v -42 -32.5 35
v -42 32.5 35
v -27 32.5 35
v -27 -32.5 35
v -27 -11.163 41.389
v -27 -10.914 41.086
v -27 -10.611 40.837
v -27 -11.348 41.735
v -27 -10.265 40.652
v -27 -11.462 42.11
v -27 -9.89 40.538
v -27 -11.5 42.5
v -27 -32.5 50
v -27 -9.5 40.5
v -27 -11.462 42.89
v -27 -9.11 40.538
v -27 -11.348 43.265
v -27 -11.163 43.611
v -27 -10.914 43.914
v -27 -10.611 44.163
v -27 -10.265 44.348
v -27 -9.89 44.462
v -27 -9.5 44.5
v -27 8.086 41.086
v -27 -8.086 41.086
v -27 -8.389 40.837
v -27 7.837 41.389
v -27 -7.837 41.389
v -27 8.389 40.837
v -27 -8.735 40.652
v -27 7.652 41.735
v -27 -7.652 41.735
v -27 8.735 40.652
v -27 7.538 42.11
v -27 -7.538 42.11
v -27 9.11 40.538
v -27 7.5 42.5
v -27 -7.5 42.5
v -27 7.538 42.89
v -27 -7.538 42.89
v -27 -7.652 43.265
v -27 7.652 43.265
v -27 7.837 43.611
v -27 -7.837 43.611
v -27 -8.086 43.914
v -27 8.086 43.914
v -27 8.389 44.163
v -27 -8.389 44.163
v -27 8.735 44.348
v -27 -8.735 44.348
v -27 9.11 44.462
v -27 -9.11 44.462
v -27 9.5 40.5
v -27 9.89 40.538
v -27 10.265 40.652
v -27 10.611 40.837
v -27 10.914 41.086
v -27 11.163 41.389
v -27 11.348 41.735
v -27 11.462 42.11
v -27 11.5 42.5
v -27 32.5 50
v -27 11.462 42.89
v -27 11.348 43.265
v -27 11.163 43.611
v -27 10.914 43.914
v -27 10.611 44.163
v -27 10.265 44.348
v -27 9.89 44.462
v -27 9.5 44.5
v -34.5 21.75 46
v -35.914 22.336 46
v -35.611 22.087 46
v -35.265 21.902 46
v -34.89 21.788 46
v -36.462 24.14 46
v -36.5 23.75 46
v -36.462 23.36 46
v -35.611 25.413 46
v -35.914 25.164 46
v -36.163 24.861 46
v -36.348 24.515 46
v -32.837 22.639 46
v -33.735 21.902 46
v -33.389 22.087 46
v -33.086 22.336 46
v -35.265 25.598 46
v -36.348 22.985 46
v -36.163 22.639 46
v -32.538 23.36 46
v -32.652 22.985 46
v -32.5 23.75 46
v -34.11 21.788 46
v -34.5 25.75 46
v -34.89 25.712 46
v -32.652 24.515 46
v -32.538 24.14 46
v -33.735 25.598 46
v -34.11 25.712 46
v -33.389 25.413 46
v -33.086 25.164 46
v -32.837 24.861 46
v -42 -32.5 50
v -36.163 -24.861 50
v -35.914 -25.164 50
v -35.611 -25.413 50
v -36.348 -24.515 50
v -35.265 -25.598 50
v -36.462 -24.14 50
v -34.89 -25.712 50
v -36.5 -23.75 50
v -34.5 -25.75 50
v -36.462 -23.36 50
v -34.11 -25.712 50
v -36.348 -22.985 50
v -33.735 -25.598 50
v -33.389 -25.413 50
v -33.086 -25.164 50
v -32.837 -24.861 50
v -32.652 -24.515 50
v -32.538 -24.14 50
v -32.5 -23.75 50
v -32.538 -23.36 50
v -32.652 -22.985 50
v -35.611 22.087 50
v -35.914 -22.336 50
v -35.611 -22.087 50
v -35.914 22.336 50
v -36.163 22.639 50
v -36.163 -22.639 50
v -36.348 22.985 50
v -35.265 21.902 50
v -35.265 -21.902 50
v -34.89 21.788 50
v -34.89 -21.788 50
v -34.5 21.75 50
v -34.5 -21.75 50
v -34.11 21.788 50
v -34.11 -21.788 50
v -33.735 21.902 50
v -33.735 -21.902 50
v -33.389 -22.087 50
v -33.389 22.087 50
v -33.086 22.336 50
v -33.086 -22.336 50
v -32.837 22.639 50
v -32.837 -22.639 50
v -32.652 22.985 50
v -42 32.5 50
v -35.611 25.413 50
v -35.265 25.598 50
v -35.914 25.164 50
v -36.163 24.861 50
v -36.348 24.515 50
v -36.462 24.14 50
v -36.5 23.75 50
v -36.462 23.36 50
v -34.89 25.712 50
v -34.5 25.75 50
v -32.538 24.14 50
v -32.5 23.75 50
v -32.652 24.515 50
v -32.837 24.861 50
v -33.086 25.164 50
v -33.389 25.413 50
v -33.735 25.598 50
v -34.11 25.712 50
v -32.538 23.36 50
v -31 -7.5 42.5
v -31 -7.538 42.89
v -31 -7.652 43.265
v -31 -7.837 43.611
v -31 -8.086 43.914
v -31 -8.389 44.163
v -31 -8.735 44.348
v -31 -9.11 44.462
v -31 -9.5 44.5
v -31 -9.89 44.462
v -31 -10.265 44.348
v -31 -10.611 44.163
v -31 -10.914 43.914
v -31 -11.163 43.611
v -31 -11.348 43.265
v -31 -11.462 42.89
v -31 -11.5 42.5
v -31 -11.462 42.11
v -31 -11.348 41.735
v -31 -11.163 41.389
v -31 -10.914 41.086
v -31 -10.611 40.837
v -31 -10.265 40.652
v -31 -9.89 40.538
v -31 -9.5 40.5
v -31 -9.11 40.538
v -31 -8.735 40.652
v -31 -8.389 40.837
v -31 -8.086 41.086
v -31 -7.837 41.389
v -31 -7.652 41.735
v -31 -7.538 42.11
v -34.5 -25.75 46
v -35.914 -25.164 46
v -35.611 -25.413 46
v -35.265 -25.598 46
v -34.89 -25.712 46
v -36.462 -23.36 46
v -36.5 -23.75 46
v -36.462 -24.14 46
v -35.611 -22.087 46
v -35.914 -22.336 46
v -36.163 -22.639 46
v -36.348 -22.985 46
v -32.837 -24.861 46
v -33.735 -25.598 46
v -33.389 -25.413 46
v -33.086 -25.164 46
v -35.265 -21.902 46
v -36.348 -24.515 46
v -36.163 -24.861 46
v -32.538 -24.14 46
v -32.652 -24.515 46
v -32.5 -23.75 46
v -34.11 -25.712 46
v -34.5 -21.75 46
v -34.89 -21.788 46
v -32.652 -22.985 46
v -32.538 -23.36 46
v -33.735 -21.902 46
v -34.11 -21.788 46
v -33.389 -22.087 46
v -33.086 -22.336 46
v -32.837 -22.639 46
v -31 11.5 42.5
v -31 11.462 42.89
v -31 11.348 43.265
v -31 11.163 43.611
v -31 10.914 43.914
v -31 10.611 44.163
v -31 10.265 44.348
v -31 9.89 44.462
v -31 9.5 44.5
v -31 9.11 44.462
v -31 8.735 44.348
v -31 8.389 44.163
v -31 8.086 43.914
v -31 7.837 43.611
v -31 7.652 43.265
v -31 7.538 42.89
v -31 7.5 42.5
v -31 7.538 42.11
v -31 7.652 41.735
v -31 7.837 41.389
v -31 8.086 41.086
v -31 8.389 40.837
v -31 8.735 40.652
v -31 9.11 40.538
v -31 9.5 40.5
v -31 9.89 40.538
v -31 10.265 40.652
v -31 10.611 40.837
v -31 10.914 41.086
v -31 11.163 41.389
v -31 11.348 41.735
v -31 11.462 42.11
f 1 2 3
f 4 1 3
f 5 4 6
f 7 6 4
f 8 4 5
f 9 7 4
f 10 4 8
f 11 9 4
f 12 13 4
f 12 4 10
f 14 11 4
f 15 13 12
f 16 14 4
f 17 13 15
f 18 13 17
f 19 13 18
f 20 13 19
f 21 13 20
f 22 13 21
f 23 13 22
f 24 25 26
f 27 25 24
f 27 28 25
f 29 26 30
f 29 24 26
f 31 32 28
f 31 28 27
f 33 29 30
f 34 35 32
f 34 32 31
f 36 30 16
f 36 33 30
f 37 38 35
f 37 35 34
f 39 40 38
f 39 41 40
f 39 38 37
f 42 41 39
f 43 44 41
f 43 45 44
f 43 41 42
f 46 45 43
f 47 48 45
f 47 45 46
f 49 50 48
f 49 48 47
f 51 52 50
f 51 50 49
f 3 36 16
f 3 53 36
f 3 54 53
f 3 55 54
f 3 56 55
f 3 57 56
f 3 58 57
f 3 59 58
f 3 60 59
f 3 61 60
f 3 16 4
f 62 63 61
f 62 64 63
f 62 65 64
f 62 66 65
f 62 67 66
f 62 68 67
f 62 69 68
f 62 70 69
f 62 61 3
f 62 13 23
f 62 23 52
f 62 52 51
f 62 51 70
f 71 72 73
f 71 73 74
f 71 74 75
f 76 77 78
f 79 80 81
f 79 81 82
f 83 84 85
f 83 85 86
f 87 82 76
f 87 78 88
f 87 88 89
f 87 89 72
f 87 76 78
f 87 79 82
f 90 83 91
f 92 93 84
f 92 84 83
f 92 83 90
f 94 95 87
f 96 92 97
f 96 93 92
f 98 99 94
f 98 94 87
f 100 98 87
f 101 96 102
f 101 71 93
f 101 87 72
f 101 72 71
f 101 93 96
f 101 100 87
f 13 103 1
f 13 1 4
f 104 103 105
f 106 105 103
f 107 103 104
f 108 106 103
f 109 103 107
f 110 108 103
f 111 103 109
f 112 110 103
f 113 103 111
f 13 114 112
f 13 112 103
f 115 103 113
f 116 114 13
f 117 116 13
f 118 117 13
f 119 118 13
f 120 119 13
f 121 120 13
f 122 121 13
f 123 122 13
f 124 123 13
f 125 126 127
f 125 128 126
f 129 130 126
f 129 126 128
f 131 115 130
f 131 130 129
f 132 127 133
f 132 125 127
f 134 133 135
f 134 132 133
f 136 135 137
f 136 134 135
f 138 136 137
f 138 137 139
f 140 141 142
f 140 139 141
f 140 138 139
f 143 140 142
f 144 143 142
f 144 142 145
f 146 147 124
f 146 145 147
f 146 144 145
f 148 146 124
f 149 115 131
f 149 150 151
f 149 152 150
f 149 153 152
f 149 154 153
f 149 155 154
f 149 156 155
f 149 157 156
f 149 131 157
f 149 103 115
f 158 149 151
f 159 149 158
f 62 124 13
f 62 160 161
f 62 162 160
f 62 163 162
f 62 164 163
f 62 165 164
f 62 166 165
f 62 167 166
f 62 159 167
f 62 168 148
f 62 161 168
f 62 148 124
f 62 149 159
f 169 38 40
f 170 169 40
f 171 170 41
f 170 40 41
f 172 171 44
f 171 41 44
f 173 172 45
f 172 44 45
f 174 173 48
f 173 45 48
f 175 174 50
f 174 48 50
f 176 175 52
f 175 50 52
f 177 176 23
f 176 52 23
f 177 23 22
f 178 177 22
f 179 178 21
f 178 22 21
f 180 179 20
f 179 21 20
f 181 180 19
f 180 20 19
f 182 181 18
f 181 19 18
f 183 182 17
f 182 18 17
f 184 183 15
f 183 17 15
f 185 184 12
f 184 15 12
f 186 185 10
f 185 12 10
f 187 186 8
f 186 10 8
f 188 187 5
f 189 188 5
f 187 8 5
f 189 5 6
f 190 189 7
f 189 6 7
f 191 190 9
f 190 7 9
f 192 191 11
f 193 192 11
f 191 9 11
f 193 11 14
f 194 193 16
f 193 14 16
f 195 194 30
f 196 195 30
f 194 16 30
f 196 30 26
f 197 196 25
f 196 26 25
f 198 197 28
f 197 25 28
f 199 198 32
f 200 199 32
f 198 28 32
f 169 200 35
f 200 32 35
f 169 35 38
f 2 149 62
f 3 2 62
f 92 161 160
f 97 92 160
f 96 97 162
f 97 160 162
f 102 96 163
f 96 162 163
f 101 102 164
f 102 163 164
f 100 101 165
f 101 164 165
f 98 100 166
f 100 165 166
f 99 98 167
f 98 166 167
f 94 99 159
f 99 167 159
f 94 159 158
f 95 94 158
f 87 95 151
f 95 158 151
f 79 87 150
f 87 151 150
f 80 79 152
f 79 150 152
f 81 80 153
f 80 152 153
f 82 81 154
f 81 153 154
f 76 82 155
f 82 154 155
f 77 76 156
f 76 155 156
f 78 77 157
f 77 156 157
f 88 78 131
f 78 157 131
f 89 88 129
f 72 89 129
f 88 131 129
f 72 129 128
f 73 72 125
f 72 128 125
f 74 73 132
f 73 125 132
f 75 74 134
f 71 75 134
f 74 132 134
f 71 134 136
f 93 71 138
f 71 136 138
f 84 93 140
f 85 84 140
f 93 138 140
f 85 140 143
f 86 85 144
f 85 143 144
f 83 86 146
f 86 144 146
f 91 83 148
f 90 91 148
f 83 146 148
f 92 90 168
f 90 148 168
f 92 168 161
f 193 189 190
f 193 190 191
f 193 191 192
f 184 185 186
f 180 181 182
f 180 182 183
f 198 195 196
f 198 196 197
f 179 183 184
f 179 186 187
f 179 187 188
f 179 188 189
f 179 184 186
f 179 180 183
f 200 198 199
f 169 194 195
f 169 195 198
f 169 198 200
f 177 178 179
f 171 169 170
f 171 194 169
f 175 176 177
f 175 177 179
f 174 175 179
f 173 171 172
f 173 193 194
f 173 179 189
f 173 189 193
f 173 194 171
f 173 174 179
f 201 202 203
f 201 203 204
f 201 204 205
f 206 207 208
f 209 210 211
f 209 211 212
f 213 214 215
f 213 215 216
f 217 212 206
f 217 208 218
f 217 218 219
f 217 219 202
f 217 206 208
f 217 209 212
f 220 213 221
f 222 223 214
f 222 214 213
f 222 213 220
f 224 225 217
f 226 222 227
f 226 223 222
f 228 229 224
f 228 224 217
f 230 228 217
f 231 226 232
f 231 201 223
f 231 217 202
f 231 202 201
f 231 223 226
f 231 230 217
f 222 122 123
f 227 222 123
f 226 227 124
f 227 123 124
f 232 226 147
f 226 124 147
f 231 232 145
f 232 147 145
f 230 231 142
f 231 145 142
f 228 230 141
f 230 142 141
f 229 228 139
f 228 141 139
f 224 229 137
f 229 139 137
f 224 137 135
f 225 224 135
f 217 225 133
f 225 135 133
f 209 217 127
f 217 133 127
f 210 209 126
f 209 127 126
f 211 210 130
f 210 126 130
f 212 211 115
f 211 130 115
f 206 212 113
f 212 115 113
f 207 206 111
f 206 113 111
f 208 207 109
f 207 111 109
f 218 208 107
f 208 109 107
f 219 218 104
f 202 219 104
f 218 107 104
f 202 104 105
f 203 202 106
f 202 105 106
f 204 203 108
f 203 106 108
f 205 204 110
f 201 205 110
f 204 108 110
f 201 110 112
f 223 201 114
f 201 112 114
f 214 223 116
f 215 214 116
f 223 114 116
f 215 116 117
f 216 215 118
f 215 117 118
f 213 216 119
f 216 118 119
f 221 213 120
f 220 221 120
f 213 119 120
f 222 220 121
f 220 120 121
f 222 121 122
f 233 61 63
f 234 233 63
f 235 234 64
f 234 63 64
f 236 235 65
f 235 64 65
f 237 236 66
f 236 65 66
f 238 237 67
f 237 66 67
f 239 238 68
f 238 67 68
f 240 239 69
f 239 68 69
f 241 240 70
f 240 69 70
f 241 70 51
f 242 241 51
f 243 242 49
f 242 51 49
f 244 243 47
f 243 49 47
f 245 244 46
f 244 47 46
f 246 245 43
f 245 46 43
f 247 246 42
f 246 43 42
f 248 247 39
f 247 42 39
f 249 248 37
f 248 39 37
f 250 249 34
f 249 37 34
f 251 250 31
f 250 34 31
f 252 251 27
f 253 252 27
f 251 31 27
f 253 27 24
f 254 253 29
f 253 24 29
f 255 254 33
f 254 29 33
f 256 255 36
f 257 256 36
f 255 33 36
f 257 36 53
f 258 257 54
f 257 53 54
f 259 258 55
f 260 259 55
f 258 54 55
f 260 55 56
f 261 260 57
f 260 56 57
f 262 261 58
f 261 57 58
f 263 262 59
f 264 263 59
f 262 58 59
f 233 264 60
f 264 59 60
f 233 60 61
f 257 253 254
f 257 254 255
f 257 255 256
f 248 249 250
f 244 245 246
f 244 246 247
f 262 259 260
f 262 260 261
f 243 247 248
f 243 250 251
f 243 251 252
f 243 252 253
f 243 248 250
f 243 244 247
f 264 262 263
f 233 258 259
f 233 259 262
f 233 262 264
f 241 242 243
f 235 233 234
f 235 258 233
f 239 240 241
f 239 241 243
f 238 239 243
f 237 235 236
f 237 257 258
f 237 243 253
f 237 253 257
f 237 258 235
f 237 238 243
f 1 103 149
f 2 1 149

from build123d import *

# Parameters (mm, degrees)
SKETCH014_W     = 15
SKETCH014_H     = 65
PAD008_DEPTH    = 15
SKETCH015_R     = 2
POCKET005_DEPTH = 4
SKETCH016_R     = 2
POCKET006_DEPTH = 4


with BuildPart() as part:
    # Sketch014 → Pad008 (new body)
    with BuildSketch(Plane(origin=(-27, 0, 50), x_dir=(1, 0, 0), z_dir=(0, 0, 1))):
        with Locations((-7.5, 0)):
            Rectangle(SKETCH014_W, SKETCH014_H)
    extrude(amount=-PAD008_DEPTH)

    # Sketch015 → Pocket005 (cut)
    with BuildSketch(Plane(origin=(-34.5, 0, 50), x_dir=(1, 0, 0), z_dir=(0, 0, 1))):
        with Locations((0, 23.75)):
            Circle(SKETCH015_R)
        with Locations((0, -23.75)):
            Circle(SKETCH015_R)
    extrude(amount=-POCKET005_DEPTH, mode=Mode.SUBTRACT)

    # Sketch016 → Pocket006 (cut)
    with BuildSketch(Plane.YZ.offset(-27)):
        with Locations((-9.5, 42.5)):
            Circle(SKETCH016_R)
        with Locations((9.5, 42.5)):
            Circle(SKETCH016_R)
    extrude(amount=-POCKET006_DEPTH, mode=Mode.SUBTRACT)


solid = part.part
